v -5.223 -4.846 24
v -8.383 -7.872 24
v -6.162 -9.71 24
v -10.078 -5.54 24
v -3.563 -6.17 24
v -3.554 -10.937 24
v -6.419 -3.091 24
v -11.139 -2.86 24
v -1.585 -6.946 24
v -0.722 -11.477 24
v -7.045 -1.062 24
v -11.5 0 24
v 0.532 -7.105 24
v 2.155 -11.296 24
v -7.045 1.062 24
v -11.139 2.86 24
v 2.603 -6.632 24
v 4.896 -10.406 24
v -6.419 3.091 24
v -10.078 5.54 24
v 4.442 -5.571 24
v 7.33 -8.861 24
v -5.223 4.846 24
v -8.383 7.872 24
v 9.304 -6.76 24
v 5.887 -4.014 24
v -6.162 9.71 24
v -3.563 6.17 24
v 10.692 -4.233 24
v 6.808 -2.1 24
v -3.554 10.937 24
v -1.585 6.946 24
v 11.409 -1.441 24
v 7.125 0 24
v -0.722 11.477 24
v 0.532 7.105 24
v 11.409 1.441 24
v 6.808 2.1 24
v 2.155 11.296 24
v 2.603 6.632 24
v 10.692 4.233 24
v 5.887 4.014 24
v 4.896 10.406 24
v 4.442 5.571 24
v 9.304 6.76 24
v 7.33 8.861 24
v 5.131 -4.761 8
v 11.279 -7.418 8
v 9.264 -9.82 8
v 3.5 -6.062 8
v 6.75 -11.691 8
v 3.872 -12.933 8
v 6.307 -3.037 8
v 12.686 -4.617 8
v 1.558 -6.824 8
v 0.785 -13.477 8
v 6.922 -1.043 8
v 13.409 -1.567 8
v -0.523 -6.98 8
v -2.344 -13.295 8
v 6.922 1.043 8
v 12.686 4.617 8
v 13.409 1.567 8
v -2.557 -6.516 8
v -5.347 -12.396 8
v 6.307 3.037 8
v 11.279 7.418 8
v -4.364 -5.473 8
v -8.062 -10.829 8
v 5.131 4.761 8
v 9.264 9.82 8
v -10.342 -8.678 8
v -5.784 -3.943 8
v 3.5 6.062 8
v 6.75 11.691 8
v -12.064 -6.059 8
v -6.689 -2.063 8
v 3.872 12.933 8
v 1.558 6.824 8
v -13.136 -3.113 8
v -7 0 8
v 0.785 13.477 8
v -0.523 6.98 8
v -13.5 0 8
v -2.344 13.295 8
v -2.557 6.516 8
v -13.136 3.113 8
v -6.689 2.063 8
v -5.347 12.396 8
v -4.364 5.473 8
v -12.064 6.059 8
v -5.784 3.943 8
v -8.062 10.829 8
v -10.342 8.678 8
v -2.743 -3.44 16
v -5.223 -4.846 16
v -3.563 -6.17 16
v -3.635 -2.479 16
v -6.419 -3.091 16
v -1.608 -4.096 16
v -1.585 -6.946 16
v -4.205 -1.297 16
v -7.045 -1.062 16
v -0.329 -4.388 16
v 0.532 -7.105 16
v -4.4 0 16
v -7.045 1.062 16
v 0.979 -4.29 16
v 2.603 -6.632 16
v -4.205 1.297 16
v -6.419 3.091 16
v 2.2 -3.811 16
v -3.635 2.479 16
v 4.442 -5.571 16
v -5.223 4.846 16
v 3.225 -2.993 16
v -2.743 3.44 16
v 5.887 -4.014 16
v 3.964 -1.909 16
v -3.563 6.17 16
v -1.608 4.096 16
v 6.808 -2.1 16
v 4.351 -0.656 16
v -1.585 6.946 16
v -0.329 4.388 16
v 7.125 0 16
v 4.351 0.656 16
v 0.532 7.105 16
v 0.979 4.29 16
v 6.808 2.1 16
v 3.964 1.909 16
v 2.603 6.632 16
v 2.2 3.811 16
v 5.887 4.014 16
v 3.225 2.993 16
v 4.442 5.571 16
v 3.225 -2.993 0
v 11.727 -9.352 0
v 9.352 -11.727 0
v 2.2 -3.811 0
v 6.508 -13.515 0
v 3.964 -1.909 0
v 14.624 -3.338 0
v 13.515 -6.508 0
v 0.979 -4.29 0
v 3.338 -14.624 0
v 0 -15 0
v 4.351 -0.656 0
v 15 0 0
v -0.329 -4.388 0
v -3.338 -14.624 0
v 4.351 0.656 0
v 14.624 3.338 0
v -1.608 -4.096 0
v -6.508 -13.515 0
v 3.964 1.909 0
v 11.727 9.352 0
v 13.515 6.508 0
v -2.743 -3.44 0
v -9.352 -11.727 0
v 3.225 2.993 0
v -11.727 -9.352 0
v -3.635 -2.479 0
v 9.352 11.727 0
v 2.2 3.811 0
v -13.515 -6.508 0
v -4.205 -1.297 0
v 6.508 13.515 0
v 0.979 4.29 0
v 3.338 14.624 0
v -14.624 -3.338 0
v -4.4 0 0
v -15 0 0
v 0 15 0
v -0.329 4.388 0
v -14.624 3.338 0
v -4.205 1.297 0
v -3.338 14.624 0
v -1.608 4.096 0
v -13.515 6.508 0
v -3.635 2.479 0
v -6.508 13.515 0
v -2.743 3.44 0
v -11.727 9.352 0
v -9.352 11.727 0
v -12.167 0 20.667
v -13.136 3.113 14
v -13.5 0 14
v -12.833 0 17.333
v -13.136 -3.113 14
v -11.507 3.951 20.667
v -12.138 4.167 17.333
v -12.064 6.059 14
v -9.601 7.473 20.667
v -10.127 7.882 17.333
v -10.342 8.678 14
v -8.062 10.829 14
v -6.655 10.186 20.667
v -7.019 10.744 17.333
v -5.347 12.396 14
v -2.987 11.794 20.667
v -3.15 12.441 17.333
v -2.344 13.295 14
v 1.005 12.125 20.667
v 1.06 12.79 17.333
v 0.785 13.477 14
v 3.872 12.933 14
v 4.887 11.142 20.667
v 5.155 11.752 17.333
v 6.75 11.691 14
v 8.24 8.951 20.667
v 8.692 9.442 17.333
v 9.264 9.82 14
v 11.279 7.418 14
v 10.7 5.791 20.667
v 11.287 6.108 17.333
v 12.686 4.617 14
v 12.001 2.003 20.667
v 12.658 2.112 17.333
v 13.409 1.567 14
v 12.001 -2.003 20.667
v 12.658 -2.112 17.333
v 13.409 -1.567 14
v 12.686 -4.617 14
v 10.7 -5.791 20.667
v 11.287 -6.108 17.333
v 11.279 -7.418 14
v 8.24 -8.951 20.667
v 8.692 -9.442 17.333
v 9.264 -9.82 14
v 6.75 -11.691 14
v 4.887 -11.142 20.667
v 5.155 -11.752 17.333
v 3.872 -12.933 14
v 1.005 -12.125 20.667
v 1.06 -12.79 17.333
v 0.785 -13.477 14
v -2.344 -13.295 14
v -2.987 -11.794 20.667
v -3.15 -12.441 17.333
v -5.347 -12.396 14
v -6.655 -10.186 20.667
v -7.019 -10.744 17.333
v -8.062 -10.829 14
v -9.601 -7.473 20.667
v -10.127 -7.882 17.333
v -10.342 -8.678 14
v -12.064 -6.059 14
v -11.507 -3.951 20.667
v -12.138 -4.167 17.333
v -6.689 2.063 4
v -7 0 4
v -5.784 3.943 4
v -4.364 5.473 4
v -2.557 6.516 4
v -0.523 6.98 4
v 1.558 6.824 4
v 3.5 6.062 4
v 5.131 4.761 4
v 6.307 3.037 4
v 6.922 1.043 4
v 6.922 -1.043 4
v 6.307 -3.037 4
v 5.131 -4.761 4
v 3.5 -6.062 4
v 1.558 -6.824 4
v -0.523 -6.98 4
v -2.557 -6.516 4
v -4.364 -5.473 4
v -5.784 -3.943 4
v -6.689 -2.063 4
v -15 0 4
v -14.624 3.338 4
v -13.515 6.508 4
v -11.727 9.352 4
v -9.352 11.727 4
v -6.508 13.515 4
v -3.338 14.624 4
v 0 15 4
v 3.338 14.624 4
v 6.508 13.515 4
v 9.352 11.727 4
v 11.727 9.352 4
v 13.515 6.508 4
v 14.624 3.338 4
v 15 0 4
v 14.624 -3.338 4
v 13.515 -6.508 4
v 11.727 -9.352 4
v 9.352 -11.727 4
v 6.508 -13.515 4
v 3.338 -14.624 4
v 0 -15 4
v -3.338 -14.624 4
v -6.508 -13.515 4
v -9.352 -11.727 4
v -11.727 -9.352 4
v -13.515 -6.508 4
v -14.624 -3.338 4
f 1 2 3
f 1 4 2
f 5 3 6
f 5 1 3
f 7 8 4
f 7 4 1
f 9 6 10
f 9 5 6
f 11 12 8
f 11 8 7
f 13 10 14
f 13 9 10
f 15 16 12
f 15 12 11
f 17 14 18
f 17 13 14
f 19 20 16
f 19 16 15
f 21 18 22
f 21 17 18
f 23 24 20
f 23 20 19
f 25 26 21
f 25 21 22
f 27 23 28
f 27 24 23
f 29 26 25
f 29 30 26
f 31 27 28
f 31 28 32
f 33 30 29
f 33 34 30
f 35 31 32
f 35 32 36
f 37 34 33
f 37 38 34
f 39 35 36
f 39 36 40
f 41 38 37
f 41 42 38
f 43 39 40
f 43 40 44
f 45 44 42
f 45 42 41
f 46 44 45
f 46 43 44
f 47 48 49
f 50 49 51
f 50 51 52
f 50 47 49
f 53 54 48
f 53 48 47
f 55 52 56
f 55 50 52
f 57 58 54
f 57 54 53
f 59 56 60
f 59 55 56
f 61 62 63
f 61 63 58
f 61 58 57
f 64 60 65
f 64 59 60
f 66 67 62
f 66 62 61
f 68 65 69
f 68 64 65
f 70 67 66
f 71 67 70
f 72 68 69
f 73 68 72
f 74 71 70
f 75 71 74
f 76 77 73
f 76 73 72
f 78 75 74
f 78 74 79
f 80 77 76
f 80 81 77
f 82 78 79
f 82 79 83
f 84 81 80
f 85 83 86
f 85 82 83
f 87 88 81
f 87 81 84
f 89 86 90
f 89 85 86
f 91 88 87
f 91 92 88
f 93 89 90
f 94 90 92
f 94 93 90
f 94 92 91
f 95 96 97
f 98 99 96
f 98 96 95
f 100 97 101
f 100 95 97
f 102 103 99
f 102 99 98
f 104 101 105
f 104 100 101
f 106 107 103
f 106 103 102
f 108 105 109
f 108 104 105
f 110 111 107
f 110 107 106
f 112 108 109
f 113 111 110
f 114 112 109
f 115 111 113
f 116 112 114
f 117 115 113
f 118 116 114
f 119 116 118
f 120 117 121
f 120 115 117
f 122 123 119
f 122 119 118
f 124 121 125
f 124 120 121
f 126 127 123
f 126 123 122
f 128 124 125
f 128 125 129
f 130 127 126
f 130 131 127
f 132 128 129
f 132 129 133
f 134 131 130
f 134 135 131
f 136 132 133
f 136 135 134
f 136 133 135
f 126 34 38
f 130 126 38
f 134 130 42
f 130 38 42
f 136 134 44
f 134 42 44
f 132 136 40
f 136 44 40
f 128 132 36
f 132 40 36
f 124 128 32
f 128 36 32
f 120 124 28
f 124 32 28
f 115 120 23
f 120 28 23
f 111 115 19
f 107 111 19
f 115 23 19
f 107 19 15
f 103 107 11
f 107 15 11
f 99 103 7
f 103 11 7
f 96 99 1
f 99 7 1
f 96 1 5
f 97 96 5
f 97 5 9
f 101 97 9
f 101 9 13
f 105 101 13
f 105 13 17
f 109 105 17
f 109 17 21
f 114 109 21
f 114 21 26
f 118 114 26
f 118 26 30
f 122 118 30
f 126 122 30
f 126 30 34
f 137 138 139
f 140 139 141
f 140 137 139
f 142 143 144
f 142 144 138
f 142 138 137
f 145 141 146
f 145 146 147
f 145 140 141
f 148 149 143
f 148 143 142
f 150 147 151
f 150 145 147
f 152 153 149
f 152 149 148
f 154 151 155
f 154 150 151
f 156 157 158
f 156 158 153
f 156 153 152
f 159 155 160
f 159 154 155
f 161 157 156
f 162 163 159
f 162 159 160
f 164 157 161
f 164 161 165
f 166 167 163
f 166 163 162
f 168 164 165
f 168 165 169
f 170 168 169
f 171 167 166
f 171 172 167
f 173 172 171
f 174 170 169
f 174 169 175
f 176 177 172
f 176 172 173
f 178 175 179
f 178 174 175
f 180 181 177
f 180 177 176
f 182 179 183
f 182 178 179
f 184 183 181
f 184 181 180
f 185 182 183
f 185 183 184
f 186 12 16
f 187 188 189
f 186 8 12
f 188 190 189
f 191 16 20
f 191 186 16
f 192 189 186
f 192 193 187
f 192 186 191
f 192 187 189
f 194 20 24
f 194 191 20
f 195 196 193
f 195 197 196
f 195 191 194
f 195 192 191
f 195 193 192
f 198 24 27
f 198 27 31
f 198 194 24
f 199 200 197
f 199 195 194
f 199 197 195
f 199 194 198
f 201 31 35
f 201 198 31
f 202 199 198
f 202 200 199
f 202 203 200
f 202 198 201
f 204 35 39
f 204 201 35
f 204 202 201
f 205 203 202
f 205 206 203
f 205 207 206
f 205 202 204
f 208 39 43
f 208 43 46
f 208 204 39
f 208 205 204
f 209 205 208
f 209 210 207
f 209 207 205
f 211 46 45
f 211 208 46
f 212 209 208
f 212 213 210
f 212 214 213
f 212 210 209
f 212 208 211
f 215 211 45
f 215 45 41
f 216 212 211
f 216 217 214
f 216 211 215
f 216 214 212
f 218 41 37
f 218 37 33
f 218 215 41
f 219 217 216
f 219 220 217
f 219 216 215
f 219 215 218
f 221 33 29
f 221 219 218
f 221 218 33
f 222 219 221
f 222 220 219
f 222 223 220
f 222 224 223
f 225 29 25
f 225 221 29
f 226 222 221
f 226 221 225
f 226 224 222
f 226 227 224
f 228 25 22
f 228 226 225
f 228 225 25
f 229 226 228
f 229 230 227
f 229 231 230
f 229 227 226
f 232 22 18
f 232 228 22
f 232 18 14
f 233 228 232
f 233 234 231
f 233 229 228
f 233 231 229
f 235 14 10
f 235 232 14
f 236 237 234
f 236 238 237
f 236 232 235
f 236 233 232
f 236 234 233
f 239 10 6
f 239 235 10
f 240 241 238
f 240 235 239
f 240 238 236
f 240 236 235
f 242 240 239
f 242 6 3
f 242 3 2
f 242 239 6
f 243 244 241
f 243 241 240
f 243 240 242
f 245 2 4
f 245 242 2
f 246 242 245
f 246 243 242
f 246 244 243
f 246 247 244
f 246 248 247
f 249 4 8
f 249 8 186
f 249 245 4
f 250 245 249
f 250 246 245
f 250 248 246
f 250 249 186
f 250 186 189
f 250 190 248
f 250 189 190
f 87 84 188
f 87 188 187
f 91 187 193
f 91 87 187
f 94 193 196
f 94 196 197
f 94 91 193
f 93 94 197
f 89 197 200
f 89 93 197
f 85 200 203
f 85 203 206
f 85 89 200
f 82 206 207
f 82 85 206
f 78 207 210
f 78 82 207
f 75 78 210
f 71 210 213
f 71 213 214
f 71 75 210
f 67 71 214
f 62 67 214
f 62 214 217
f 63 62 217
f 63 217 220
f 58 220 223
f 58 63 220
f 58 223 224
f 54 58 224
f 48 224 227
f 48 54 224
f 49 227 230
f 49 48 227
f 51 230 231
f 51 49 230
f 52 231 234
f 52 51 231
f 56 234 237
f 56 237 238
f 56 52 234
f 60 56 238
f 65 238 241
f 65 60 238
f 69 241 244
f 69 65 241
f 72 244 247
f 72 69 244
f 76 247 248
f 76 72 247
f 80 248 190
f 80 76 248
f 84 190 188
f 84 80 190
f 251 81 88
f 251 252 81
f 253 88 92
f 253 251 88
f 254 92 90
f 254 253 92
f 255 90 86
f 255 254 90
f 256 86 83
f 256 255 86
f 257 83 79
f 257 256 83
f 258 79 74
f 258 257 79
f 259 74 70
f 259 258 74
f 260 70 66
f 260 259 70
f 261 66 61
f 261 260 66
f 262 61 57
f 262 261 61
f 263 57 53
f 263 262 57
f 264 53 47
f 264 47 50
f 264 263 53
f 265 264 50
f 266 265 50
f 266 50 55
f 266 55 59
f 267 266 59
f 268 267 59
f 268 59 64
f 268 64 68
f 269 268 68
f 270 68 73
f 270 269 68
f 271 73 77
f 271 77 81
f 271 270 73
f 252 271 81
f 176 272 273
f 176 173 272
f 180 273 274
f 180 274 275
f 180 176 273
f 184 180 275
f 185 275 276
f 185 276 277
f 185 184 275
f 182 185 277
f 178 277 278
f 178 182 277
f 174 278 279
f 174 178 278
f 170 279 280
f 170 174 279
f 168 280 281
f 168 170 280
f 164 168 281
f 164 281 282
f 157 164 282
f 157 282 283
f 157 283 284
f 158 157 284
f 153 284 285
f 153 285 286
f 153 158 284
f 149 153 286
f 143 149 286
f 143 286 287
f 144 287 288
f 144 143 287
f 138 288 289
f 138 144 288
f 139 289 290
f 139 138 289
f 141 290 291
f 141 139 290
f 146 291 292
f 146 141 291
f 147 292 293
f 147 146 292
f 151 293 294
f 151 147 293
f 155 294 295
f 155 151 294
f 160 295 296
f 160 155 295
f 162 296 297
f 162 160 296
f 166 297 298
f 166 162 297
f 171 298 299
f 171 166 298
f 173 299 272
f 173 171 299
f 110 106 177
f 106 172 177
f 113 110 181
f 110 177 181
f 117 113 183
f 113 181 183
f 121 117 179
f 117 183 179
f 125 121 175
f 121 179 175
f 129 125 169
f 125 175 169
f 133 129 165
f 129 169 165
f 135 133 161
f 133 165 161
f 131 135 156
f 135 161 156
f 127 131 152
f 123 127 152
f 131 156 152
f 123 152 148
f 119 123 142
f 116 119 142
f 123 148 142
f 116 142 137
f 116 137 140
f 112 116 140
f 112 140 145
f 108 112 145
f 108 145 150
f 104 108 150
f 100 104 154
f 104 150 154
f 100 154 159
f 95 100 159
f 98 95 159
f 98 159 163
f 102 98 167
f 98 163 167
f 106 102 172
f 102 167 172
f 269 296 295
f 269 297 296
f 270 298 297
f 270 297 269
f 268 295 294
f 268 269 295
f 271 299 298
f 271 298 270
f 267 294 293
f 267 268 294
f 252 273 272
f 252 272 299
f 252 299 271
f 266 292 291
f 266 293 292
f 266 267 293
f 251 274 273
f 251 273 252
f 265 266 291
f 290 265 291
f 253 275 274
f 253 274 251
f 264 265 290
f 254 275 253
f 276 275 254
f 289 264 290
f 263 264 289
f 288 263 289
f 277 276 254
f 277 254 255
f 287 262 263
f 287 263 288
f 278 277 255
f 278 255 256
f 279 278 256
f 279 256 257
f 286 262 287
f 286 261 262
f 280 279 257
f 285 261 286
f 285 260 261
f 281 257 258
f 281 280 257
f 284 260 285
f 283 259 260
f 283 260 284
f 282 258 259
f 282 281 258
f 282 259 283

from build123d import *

# Parameters (mm, degrees)
F2_SIZE2       = 10
F2_SIZE        = 2
F4_D           = 8.8
F4_CBORE_D     = 14.25
F4_CBORE_DEPTH = 8


with BuildPart() as f1:
    # F0 (on Front) → F1 (revolve)
    with BuildSketch(Plane.XZ):
        Polygon((-15, 0), (0, 0), (0, 24), (-13.5, 24), (-13.5, 8), (-7, 8), (-7, 4), (-15, 4), align=None)
    revolve(axis=Axis((0, 0, 12), (0, 0, -1)))

    # F2
    f2_edges = [f1.edges().sort_by_distance(p)[0] for p in [
        (13.5, 0, 24),
    ]]
    chamfer(f2_edges, length=F2_SIZE, length2=F2_SIZE2)

    # F4 (through all)
    with Locations(Plane.XY.offset(24)):
        with Locations((0, 0)):
            CounterBoreHole(F4_D / 2, F4_CBORE_D / 2, F4_CBORE_DEPTH)


solid = f1.part
